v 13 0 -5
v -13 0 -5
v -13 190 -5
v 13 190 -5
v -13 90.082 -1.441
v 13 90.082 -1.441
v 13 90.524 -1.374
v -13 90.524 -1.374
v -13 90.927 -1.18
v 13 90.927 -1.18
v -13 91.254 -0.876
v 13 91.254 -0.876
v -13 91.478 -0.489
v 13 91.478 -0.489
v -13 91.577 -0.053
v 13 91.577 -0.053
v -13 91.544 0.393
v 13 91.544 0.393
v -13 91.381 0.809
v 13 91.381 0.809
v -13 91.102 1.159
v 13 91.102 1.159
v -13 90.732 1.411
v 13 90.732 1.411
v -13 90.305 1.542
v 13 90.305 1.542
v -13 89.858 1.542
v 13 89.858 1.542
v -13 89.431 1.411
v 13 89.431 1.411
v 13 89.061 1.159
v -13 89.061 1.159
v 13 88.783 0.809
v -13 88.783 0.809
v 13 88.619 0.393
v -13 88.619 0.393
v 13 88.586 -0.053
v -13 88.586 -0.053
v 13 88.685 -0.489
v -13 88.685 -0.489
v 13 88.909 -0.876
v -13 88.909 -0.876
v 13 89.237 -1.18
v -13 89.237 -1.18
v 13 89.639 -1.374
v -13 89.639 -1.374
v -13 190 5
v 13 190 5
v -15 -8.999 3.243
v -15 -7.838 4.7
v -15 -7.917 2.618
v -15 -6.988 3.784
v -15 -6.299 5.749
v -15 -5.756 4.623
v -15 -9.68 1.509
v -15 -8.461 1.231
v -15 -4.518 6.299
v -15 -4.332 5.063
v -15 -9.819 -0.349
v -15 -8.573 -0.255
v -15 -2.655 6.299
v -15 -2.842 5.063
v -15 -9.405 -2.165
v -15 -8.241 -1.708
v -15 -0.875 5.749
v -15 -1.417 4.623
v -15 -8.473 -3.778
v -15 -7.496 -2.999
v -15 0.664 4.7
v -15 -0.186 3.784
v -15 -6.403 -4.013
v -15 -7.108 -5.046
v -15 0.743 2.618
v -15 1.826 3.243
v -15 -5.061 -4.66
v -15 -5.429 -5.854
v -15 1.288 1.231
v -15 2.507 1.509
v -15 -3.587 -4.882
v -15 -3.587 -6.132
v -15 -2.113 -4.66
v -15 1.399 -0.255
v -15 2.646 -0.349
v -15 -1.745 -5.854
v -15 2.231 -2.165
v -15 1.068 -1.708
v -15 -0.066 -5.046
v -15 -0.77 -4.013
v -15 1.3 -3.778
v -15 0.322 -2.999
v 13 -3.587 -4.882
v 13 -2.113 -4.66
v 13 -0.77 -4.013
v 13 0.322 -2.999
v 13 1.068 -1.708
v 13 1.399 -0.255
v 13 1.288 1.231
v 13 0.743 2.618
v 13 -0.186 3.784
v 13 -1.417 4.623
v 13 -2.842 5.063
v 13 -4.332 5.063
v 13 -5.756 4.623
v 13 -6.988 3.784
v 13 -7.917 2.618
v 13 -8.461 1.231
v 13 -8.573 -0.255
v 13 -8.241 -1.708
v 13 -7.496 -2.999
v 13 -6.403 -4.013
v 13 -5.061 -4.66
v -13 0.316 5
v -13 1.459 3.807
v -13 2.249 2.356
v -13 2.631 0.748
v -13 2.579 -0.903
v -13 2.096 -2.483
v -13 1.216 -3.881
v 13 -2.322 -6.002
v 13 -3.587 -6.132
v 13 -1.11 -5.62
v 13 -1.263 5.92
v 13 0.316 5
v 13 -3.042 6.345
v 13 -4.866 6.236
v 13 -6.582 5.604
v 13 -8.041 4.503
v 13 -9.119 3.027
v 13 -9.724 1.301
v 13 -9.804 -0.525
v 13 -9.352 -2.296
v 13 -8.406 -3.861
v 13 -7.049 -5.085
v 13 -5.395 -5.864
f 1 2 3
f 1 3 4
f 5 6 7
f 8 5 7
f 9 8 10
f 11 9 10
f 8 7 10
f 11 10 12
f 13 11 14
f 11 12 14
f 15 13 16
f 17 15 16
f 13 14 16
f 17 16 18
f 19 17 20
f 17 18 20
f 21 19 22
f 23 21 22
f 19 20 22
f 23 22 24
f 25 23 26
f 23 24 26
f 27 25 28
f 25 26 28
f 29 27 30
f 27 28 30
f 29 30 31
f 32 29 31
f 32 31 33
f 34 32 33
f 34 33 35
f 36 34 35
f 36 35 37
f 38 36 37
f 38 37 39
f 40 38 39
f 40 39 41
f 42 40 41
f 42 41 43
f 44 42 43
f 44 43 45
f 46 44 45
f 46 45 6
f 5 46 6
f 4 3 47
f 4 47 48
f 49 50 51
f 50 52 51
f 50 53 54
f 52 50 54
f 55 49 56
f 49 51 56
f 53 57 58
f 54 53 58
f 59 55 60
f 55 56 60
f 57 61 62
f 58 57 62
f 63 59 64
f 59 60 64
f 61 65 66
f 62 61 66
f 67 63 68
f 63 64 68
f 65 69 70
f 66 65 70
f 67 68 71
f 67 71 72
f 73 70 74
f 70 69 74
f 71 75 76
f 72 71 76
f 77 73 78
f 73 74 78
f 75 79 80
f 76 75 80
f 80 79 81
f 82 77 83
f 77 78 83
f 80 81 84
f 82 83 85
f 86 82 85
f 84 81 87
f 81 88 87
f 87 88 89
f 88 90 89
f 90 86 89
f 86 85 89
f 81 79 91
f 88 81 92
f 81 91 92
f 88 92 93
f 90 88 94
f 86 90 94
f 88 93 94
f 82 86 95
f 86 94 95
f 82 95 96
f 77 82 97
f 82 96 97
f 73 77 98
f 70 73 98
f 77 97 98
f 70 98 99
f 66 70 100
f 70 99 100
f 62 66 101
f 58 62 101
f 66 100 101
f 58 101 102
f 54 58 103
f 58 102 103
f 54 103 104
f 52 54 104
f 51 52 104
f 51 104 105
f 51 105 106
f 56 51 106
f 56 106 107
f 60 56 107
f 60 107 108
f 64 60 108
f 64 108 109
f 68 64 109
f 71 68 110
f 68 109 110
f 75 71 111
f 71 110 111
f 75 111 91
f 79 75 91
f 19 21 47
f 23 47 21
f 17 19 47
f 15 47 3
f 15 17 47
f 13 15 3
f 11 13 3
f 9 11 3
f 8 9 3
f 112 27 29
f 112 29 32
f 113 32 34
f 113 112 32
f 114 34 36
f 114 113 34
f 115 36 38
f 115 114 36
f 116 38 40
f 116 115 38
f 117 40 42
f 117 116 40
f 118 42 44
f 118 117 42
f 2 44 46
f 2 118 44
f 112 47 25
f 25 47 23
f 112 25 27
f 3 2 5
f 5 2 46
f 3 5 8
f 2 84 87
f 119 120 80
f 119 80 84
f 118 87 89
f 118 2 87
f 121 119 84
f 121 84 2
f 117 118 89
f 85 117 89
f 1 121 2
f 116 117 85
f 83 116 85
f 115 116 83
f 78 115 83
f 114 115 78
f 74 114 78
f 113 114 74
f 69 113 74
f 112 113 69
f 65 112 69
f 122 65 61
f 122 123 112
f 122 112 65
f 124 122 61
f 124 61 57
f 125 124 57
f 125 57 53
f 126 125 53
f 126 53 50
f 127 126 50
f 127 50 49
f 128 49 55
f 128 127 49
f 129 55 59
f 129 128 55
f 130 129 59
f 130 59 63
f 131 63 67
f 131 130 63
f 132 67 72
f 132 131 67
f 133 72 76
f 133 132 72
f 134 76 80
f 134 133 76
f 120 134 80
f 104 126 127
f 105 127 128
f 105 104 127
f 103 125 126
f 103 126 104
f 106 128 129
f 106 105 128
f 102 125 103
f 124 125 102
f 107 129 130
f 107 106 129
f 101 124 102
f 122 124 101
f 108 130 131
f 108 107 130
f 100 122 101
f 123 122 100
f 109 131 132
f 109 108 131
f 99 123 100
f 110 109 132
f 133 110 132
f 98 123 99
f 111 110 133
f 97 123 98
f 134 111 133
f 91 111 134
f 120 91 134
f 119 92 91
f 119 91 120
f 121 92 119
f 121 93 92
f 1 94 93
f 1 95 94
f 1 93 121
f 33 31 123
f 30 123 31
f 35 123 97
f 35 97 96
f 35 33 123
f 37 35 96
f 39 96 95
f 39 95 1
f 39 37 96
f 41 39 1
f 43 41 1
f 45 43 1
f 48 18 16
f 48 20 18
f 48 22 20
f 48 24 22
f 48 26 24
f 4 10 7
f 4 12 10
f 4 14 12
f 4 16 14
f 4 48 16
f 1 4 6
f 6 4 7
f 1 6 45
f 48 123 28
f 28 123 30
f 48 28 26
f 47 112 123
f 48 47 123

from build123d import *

# Parameters (mm, degrees)
SKETCH8_W           = 26
SKETCH8_H           = 10
BOSS_EXTRUDE5_DEPTH = 190
SKETCH9_R           = 6.25
BOSS_EXTRUDE7_DEPTH = 28
SKETCH13_R          = 5
CUT_EXTRUDE3_DEPTH  = 28
SKETCH14_R          = 1.5
CUT_EXTRUDE4_DEPTH  = 28


with BuildPart() as part:
    # Sketch8 → Boss-Extrude5 (new body)
    with BuildSketch(Plane(origin=(0, 0, 0), x_dir=(1, 0, 0), z_dir=(0, 1, 0))):
        Rectangle(SKETCH8_W, SKETCH8_H)
    extrude(amount=BOSS_EXTRUDE5_DEPTH)

    # Sketch9 → Boss-Extrude7 (add)
    with BuildSketch(Plane(origin=(13, 0, 0), x_dir=(0, 0, -1), z_dir=(1, 0, 0))):
        with Locations((-0.118358798, -3.586767795)):
            Circle(SKETCH9_R)
    extrude(amount=-BOSS_EXTRUDE7_DEPTH)

    # Sketch13 → Cut-Extrude3 (cut)
    with BuildSketch(Plane(origin=(13, 0, 0), x_dir=(0, 0, -1), z_dir=(1, 0, 0))):
        with Locations((-0.118358798, -3.586767795)):
            Circle(SKETCH13_R)
    extrude(amount=-CUT_EXTRUDE3_DEPTH, mode=Mode.SUBTRACT)

    # Sketch14 → Cut-Extrude4 (cut)
    with BuildSketch(Plane(origin=(13, 0, 0), x_dir=(0, 0, -1), z_dir=(1, 0, 0))):
        with Locations((-0.059179399, 90.081616102)):
            Circle(SKETCH14_R)
    extrude(amount=-CUT_EXTRUDE4_DEPTH, mode=Mode.SUBTRACT)


solid = part.part
